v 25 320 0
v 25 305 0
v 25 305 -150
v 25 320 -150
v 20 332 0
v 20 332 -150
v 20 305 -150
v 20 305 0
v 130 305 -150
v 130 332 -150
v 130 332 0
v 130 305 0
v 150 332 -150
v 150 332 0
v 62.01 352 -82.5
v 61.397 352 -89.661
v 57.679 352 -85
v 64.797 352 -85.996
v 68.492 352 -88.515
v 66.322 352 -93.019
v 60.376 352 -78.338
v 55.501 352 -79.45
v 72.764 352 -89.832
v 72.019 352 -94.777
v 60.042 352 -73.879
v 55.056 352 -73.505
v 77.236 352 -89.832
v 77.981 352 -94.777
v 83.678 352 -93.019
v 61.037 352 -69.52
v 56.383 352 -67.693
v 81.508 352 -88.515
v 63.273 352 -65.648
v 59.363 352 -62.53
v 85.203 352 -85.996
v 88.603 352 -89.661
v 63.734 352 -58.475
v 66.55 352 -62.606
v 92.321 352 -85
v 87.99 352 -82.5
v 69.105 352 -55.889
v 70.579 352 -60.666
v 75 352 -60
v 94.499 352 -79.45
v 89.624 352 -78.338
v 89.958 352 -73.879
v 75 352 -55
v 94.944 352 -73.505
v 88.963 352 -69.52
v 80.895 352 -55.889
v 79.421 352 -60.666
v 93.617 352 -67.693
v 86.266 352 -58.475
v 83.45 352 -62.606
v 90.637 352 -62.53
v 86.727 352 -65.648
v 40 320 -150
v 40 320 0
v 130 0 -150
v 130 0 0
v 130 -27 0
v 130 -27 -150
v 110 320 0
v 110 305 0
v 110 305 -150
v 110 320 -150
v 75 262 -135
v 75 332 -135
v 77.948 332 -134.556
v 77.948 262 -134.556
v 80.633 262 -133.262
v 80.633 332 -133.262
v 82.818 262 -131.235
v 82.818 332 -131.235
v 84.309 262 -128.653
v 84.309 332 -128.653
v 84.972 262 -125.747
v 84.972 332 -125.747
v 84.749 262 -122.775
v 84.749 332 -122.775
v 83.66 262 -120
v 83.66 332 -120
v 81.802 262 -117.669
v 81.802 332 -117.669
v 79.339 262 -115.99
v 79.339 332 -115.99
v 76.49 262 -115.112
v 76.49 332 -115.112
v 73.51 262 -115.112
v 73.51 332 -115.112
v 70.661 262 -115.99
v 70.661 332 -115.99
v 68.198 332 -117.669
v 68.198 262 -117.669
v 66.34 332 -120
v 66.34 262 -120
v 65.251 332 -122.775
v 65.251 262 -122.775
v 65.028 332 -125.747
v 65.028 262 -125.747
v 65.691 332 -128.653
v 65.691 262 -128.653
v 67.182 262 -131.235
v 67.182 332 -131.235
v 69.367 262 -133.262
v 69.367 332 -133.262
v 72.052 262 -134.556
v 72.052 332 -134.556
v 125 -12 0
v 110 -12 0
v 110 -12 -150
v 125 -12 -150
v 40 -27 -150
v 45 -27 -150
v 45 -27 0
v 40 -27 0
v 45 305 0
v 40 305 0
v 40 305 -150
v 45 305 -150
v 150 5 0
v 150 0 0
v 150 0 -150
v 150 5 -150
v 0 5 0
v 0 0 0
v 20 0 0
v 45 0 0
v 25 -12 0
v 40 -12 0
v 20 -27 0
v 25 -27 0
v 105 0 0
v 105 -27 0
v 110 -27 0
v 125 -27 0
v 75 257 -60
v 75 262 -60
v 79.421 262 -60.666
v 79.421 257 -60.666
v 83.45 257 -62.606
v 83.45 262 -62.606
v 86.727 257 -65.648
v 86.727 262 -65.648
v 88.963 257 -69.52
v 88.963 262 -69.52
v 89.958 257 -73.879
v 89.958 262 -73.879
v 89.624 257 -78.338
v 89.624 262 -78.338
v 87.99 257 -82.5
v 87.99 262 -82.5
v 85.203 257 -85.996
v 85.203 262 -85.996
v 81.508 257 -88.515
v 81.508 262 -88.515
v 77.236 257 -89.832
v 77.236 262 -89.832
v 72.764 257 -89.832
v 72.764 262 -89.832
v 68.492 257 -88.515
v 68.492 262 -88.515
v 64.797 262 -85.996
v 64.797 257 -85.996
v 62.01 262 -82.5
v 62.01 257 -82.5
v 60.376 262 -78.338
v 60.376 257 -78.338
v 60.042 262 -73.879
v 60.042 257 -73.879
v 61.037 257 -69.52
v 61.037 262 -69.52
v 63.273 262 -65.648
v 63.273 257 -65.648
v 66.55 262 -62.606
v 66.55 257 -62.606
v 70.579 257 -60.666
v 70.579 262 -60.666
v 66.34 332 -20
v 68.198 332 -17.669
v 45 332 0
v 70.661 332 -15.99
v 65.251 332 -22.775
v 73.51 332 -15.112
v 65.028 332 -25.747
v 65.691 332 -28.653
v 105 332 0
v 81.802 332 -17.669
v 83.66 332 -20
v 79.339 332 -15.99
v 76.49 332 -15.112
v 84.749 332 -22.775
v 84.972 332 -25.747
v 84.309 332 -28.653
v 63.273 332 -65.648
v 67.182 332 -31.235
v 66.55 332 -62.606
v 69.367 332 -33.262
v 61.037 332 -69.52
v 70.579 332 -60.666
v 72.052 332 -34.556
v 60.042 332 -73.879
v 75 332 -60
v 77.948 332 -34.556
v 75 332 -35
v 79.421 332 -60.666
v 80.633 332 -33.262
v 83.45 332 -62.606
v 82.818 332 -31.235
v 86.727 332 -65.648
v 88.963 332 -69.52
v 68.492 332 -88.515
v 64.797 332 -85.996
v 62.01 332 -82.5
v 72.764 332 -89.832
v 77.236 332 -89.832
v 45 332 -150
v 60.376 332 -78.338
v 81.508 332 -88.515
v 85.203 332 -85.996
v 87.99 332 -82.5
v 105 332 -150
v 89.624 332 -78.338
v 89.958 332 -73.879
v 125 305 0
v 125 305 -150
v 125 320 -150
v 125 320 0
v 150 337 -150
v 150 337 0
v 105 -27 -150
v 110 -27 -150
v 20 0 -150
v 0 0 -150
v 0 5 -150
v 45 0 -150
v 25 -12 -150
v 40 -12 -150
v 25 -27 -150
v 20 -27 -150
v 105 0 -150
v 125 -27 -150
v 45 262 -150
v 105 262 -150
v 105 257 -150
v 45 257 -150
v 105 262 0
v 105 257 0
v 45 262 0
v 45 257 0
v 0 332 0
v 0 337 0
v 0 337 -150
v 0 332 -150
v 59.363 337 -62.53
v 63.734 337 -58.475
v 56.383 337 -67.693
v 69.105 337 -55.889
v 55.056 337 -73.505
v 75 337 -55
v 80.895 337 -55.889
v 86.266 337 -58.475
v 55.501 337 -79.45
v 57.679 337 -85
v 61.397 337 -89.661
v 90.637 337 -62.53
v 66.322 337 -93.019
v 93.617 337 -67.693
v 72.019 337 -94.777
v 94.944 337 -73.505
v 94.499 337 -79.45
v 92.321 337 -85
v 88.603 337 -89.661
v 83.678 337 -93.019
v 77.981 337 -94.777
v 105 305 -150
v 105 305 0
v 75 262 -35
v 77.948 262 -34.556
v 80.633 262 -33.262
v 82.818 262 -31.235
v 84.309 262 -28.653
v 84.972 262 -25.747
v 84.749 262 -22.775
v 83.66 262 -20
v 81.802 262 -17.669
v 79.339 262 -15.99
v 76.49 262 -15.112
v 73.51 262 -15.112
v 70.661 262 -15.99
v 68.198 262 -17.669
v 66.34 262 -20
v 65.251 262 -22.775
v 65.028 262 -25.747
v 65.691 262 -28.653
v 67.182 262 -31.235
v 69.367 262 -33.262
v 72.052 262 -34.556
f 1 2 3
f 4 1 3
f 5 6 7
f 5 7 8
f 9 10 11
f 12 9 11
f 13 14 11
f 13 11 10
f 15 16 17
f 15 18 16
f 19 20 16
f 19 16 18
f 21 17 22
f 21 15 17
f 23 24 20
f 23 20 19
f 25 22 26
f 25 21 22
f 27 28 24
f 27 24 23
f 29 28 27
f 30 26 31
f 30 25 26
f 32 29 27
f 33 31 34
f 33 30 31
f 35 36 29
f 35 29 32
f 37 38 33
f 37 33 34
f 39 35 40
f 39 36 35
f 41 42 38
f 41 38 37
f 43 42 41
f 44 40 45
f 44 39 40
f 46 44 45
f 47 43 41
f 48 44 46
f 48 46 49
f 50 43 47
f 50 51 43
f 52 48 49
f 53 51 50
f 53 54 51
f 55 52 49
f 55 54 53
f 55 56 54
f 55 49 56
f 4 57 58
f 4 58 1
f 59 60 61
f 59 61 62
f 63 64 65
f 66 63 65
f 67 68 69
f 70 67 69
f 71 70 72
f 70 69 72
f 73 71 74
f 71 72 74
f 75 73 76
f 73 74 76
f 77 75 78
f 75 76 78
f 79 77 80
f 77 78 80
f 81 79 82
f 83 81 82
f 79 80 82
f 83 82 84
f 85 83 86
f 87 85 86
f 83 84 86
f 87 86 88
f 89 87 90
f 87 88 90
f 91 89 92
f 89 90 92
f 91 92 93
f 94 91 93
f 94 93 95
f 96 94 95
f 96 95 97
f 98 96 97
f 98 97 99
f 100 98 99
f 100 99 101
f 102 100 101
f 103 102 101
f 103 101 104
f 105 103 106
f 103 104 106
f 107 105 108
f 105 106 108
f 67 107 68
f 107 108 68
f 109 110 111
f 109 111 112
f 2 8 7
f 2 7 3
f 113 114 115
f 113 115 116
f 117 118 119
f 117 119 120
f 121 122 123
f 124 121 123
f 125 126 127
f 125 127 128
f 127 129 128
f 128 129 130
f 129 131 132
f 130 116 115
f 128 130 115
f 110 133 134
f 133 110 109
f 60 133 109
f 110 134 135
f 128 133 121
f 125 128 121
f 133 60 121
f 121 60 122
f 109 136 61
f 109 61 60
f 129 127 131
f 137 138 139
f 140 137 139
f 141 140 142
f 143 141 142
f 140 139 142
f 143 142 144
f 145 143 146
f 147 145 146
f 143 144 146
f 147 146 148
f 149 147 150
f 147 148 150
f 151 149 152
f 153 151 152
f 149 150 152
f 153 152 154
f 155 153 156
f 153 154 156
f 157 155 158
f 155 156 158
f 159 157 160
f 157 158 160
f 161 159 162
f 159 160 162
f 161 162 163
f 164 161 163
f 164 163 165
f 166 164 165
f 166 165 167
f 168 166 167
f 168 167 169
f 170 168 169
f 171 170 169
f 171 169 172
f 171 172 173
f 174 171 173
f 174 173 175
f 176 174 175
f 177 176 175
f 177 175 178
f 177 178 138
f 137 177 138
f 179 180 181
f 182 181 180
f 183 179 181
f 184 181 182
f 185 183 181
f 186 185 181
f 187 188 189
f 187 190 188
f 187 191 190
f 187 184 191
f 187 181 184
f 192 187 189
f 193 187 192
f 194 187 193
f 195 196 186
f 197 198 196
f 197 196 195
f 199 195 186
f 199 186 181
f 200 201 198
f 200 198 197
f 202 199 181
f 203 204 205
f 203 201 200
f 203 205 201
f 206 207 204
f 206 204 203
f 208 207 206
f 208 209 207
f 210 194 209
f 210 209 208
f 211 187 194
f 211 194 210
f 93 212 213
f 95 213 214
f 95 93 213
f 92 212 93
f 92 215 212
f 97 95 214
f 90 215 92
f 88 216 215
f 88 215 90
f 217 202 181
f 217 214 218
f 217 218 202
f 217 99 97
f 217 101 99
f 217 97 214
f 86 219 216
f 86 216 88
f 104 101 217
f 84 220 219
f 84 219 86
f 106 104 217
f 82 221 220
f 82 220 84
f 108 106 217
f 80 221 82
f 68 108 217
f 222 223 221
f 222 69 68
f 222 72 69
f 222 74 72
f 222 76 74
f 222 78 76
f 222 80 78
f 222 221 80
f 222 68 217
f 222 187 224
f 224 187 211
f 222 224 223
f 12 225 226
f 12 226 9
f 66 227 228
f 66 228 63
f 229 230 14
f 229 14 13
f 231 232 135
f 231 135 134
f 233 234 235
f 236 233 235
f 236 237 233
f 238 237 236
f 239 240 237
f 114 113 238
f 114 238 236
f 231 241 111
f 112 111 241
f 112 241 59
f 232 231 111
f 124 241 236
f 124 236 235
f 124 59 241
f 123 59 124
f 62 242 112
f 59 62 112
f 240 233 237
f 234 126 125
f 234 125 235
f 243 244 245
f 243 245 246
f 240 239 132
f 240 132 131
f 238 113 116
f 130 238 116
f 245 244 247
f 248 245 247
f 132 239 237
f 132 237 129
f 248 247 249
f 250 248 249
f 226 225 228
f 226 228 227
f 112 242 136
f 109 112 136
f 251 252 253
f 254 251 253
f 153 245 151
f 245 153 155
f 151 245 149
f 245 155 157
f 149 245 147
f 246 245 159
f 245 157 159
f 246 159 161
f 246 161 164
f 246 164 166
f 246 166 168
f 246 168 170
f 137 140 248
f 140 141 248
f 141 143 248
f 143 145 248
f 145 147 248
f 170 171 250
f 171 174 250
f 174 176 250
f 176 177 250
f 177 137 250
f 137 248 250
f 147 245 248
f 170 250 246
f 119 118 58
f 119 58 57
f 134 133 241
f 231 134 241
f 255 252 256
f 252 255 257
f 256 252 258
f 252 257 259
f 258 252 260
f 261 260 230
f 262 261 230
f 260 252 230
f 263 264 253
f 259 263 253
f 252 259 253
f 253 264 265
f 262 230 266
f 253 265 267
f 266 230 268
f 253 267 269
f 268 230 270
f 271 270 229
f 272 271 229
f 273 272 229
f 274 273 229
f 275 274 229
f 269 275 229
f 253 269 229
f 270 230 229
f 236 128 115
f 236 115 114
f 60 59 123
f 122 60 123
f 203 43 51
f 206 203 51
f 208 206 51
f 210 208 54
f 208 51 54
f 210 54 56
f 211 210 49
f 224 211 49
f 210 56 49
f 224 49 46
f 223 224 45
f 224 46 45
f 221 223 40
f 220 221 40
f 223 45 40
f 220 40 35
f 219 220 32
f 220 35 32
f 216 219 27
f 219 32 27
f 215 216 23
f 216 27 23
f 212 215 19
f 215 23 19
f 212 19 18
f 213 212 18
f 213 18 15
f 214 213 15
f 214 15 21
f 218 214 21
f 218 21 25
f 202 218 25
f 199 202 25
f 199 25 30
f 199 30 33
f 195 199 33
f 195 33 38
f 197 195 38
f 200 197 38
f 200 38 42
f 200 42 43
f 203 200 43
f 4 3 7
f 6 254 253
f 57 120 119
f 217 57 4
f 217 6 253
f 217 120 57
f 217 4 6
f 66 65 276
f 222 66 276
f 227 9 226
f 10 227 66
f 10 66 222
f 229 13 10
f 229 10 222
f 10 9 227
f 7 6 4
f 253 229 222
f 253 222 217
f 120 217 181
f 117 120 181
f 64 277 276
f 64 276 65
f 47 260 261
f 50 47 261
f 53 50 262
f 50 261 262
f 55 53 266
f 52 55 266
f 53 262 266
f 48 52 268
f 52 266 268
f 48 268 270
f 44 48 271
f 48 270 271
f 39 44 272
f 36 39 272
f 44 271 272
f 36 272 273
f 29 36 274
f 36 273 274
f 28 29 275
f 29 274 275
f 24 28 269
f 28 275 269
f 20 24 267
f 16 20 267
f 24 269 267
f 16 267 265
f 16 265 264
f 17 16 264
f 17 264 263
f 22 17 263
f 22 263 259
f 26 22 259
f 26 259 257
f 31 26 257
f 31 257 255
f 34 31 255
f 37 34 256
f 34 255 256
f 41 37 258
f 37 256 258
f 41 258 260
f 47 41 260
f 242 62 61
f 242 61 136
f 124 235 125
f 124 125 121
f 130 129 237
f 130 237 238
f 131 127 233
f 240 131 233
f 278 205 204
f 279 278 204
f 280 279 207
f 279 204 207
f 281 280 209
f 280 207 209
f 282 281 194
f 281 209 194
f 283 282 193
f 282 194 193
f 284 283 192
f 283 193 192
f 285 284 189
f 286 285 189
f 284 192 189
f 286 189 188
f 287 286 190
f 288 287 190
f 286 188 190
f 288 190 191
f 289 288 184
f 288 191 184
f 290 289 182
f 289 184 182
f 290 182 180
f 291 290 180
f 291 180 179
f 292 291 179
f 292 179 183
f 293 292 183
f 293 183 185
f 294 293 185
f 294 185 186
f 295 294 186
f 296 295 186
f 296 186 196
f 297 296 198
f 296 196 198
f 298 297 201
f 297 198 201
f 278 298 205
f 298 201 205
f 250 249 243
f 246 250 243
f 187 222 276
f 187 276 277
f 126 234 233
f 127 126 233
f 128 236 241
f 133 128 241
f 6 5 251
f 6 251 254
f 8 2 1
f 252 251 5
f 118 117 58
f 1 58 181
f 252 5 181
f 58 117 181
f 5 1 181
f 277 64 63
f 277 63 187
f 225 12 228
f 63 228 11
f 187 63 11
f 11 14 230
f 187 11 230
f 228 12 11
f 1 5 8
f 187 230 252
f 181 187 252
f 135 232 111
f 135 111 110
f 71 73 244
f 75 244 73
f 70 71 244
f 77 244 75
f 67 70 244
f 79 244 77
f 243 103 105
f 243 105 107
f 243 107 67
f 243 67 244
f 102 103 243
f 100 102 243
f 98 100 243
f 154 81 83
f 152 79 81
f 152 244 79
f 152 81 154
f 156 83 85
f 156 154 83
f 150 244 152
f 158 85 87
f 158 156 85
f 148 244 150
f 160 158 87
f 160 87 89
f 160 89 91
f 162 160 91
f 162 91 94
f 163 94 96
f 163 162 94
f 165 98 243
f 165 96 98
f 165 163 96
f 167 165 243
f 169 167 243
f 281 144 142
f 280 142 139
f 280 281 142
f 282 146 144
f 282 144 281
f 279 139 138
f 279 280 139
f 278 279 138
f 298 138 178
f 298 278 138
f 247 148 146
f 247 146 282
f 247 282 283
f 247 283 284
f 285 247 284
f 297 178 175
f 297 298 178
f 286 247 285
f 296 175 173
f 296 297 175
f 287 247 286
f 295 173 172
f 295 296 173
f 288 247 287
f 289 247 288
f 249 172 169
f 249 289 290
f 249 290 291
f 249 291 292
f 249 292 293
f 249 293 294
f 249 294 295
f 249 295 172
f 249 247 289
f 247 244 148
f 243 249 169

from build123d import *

# Parameters (mm, degrees)
SKETCH_1_W          = 150
SKETCH_1_H          = 150
EXTRUDE_1_DEPTH     = 5
SKETCH_2_W          = 25
SKETCH_2_H          = 150
EXTRUDE_2_DEPTH     = 27
SKETCH_3_W          = 15
SKETCH_3_H          = 150
CUT_EXTRUDE_1_DEPTH = 15
SKETCH_5_W          = 150
SKETCH_5_H          = 5
EXTRUDE_3_DEPTH     = 150
SKETCH_6_W          = 25
SKETCH_6_H          = 150
EXTRUDE_4_DEPTH     = 27
SKETCH_7_W          = 15
SKETCH_7_H          = 150
CUT_EXTRUDE_3_DEPTH = 15
SKETCH_8_R          = 20
EXTRUDE_5_DEPTH     = 15
SKETCH_9_R          = 10
EXTRUDE_6_DEPTH     = 70
EXTRUDE_7_DEPTH     = 5
SKETCH_12_R         = 15
CUT_EXTRUDE_4_DEPTH = 95


with BuildPart() as part:
    # 草图1 → 凸台-拉伸1 (new body)
    with BuildSketch(Plane(origin=(0, 0, 0), x_dir=(1, 0, 0), z_dir=(0, 1, 0))):
        with Locations((75, 75)):
            Rectangle(SKETCH_1_W, SKETCH_1_H)
    extrude(amount=EXTRUDE_1_DEPTH)

    # 草图2 → 凸台-拉伸2 (add)
    with BuildSketch(Plane(origin=(0, 0, 0), x_dir=(-1, 0, 0), z_dir=(0, -1, 0))):
        with Locations((-32.5, 75)):
            Rectangle(SKETCH_2_W, SKETCH_2_H)
        with Locations((-117.5, 75)):
            Rectangle(SKETCH_2_W, SKETCH_2_H)
    extrude(amount=EXTRUDE_2_DEPTH)

    # 草图3 → 切除-拉伸1 (cut)
    with BuildSketch(Plane.XZ.offset(27)):
        with Locations((32.5, -75)):
            Rectangle(SKETCH_3_W, SKETCH_3_H)
        with Locations((117.5, -75)):
            Rectangle(SKETCH_3_W, SKETCH_3_H)
    extrude(amount=-CUT_EXTRUDE_1_DEPTH, mode=Mode.SUBTRACT)


with BuildPart() as body_2:
    # 草图5 → 凸台-拉伸3 (new body)
    with BuildSketch(Plane(origin=(150, 0, 0), x_dir=(0, 0, -1), z_dir=(1, 0, 0))):
        with Locations((75, 334.5)):
            Rectangle(SKETCH_5_W, SKETCH_5_H)
    extrude(amount=-EXTRUDE_3_DEPTH)

    # 草图6 → 凸台-拉伸4 (add)
    with BuildSketch(Plane.XZ.offset(-332)):
        with Locations((117.5, -75)):
            Rectangle(SKETCH_6_W, SKETCH_6_H)
        with Locations((32.5, -75)):
            Rectangle(SKETCH_6_W, SKETCH_6_H)
    extrude(amount=EXTRUDE_4_DEPTH)

    # 草图7 → 切除-拉伸3 (cut)
    with BuildSketch(Plane(origin=(0, 305, 0), x_dir=(-1, 0, 0), z_dir=(0, -1, 0))):
        with Locations((-117.5, 75)):
            Rectangle(SKETCH_7_W, SKETCH_7_H)
        with Locations((-32.5, 75)):
            Rectangle(SKETCH_7_W, SKETCH_7_H)
    extrude(amount=-CUT_EXTRUDE_3_DEPTH, mode=Mode.SUBTRACT)

    # 草图8 → 凸台-拉伸5 (add)
    with BuildSketch(Plane(origin=(0, 337, 0), x_dir=(1, 0, 0), z_dir=(0, 1, 0))):
        with Locations(Location((75, 75, 0), (0, 0, 270))):
            Circle(SKETCH_8_R)
    extrude(amount=EXTRUDE_5_DEPTH)

    # 草图9 → 凸台-拉伸6 (add)
    with BuildSketch(Plane(origin=(0, 332, 0), x_dir=(-1, 0, 0), z_dir=(0, -1, 0))):
        with Locations(Location((-75, 25, 0), (0, 0, 90))):
            Circle(SKETCH_9_R)
        with Locations(Location((-75, 125, 0), (0, 0, 90))):
            Circle(SKETCH_9_R)
    extrude(amount=EXTRUDE_6_DEPTH)

    # 草图10 → 凸台-拉伸7 (add)
    with BuildSketch(Plane.XZ.offset(-262)):
        Polygon((75, 0), (105, 0), (105, -125), (105, -150), (45, -150), (45, -125), (45, 0), align=None)
    extrude(amount=EXTRUDE_7_DEPTH)

    # 草图12 → 切除-拉伸4 (cut)
    with BuildSketch(Plane(origin=(0, 352, 0), x_dir=(1, 0, 0), z_dir=(0, 1, 0))):
        with Locations(Location((75, 75, 0), (0, 0, 270))):
            Circle(SKETCH_12_R)
    extrude(amount=-CUT_EXTRUDE_4_DEPTH, mode=Mode.SUBTRACT)


solid = Compound([part.part, body_2.part])
